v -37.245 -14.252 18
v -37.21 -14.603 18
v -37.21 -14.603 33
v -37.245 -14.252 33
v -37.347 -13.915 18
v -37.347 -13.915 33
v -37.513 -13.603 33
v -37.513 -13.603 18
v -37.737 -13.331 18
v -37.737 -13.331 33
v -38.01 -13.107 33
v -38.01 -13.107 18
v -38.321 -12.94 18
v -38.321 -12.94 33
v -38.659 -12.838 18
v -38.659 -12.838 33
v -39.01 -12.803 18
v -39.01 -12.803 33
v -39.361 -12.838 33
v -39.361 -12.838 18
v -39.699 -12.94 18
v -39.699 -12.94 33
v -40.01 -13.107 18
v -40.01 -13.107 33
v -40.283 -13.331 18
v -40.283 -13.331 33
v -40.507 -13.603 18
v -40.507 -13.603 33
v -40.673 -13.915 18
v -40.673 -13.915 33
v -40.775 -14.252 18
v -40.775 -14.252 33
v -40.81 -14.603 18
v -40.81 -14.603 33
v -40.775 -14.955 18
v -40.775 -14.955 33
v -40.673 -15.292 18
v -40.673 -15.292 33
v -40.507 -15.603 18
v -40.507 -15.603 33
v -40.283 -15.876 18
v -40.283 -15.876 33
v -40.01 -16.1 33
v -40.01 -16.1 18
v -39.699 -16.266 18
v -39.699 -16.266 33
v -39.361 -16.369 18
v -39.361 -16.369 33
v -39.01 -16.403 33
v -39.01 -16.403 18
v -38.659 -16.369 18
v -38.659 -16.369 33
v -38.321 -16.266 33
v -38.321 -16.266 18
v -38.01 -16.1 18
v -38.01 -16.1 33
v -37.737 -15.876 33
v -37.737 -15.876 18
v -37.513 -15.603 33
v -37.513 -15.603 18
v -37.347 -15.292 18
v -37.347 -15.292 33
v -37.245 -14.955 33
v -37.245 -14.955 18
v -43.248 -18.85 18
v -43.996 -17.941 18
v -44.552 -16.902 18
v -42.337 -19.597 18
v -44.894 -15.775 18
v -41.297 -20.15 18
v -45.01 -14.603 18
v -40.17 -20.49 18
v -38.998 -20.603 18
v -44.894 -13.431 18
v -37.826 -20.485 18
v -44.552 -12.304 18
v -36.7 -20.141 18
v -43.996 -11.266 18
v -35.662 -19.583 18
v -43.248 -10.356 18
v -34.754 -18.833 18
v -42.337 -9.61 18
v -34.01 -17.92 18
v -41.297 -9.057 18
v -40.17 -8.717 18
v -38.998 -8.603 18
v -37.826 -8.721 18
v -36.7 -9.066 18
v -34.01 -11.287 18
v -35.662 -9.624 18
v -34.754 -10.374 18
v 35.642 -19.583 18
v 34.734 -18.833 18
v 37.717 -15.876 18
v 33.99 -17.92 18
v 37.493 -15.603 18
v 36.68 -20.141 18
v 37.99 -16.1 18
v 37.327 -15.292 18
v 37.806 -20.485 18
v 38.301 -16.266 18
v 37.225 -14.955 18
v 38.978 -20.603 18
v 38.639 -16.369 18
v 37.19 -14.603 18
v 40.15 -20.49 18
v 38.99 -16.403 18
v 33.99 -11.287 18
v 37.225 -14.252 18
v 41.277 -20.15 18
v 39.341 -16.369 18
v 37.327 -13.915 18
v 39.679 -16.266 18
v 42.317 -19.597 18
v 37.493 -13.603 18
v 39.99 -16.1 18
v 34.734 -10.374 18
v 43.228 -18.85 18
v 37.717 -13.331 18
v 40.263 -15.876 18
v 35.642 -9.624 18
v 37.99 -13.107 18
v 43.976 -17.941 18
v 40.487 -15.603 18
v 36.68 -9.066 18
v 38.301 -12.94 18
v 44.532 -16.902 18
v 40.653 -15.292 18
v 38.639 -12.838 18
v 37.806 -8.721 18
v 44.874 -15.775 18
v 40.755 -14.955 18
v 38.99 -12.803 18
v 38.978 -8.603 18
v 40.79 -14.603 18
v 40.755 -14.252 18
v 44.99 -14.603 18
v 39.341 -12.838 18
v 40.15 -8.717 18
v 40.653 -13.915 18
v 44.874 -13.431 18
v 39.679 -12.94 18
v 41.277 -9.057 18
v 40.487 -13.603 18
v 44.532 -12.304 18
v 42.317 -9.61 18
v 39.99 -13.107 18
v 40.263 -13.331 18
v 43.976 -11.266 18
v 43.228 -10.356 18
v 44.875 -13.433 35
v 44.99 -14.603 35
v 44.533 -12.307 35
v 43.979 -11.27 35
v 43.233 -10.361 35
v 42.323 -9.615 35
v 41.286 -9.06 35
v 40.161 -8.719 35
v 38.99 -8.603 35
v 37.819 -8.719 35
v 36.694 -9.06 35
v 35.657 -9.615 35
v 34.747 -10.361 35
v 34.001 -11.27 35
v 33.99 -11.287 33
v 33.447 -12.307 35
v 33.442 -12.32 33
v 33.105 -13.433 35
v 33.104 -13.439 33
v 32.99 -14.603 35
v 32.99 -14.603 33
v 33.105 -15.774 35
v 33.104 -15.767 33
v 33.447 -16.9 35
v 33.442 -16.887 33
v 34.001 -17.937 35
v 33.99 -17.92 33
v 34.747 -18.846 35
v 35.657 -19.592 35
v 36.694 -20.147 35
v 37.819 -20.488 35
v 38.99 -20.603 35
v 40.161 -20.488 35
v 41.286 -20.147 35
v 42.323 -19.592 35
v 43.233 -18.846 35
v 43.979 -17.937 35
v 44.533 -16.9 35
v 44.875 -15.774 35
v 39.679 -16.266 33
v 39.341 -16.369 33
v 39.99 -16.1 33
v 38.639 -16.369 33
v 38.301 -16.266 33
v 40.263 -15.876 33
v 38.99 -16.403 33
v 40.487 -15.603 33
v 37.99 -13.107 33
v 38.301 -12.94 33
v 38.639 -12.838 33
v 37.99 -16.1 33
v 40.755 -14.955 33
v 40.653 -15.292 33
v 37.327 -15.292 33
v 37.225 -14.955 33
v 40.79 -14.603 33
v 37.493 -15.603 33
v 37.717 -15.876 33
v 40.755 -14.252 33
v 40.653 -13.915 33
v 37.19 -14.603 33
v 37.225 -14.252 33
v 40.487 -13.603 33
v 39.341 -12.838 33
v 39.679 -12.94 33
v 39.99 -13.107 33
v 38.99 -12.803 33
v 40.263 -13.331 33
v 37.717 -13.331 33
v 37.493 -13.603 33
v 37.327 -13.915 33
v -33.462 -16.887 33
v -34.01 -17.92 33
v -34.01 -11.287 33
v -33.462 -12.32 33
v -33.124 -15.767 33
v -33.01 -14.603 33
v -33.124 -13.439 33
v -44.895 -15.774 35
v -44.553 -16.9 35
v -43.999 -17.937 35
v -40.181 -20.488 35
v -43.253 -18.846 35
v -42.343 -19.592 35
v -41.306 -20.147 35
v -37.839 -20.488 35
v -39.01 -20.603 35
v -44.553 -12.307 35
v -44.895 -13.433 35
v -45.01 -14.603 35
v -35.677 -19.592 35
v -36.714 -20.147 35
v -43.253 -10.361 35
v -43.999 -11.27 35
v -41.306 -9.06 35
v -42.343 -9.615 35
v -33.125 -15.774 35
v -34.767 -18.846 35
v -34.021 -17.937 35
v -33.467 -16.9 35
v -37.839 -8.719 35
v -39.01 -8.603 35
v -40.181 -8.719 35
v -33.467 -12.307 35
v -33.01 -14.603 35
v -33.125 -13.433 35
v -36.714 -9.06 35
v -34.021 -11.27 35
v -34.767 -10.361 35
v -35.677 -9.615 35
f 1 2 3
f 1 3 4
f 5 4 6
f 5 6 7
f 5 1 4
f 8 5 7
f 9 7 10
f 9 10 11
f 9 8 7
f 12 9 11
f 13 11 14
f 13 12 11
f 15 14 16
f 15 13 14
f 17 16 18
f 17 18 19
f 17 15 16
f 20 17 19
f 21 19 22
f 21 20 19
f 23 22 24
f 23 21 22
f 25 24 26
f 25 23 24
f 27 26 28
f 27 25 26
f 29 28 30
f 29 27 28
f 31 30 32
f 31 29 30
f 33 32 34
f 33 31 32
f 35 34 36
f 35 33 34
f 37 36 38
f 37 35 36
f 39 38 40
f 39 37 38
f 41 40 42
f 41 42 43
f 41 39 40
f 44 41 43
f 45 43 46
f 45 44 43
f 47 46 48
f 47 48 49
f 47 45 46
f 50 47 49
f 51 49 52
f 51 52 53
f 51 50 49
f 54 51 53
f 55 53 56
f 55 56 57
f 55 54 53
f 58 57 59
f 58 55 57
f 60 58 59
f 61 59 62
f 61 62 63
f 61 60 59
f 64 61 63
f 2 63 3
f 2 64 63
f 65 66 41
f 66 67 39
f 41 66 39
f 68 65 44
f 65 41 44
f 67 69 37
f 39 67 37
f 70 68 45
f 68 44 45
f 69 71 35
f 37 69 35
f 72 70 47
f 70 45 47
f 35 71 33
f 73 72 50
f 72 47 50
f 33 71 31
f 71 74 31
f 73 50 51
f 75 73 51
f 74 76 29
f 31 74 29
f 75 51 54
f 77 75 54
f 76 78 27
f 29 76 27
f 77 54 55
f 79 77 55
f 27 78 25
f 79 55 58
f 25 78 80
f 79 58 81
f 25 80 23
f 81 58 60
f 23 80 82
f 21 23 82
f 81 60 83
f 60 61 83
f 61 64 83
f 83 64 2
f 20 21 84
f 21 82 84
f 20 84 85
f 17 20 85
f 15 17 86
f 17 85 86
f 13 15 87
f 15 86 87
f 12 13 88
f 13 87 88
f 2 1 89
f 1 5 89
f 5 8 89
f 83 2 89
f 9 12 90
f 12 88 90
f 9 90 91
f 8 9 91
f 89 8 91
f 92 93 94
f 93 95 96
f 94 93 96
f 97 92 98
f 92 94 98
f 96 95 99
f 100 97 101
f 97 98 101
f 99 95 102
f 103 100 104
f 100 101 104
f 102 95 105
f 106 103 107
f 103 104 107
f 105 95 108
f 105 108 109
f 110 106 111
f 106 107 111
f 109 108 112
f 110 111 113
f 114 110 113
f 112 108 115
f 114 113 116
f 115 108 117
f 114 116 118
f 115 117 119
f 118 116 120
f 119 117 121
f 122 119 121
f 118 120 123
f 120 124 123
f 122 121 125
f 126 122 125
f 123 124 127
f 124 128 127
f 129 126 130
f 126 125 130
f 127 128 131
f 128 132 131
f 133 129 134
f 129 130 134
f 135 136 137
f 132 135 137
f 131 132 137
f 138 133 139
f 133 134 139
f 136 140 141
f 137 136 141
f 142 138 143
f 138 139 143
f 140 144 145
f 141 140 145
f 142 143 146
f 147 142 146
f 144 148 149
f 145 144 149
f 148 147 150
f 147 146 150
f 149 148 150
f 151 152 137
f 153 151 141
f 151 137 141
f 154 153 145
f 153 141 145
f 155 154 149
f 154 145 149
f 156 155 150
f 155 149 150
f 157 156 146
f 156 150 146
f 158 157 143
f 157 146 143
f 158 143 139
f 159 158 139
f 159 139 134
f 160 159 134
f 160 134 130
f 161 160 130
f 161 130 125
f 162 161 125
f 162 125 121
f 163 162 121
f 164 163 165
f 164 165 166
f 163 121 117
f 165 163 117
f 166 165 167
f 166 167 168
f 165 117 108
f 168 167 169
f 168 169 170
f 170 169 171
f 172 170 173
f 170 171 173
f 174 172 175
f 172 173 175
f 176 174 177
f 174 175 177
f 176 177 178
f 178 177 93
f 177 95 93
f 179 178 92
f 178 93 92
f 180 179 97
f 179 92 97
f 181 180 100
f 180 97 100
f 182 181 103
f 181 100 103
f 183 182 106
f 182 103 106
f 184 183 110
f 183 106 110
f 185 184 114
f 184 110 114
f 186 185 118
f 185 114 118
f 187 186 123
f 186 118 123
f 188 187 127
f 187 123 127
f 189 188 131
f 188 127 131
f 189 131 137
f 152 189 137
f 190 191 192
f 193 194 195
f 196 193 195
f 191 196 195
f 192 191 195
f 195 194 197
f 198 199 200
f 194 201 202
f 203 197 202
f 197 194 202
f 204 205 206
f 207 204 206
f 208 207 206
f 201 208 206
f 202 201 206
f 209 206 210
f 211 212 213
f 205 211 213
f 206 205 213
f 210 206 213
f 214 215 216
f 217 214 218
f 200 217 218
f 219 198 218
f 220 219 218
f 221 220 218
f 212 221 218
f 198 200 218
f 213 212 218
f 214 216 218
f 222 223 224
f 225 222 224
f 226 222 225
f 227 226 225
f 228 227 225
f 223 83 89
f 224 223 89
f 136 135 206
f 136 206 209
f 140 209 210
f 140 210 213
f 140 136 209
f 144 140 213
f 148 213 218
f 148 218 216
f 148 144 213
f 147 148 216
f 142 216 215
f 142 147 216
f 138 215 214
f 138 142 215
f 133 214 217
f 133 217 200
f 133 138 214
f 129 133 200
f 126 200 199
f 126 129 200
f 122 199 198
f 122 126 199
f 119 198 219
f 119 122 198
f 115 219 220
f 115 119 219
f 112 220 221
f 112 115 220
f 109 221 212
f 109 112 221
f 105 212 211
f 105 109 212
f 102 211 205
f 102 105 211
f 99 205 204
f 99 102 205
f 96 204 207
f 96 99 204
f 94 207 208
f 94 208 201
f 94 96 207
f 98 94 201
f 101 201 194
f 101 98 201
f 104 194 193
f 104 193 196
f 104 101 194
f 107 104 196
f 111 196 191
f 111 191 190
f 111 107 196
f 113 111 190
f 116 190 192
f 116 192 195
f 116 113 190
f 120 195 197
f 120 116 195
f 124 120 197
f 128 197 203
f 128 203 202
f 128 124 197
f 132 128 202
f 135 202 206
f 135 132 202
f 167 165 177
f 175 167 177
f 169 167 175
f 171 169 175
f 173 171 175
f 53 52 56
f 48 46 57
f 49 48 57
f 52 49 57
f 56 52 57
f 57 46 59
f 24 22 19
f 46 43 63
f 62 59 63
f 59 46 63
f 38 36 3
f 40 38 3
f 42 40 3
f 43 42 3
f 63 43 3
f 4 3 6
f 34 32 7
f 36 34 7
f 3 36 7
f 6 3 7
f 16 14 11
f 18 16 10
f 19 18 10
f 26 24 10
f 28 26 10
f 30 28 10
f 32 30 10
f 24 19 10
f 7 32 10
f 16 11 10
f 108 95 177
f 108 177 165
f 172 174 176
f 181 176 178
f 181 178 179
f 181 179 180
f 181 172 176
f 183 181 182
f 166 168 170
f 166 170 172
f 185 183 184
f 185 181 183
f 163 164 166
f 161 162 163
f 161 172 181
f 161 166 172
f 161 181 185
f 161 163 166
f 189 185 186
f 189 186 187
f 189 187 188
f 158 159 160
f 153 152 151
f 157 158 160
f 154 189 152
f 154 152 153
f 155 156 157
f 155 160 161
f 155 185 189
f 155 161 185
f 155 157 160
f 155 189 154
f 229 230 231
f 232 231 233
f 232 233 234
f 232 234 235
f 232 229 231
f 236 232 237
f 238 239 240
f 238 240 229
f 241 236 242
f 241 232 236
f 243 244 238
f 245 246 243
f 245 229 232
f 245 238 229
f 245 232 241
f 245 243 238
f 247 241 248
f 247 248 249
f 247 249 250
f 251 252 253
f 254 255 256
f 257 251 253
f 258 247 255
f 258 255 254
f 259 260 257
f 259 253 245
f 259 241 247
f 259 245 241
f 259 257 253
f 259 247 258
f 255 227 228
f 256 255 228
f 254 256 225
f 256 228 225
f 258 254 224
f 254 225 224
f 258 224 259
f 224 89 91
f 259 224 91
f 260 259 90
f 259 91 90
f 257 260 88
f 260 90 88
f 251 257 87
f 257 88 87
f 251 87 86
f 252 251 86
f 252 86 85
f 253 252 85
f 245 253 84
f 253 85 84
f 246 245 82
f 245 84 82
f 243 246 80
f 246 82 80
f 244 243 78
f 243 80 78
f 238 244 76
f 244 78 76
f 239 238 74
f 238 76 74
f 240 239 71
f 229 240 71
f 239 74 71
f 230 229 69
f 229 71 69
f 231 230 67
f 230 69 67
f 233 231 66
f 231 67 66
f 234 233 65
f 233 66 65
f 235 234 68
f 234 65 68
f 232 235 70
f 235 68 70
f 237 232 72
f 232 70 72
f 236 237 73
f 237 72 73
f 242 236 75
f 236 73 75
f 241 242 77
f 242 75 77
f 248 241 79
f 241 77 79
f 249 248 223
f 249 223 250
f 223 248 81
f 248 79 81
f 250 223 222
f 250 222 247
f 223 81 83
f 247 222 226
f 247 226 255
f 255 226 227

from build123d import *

# Parameters (mm, degrees)
BOX014_W          = 10
BOX014_H          = 10
BOX014_DEPTH      = 15
CYLINDER022_R     = 1.8
CYLINDER022_DEPTH = 15
CYLINDER021_R     = 6
CYLINDER021_DEPTH = 17
BOX012_W          = 5
BOX012_H          = 5
BOX012_DEPTH      = 17
BOX013_W          = 10
BOX013_H          = 10
BOX013_DEPTH      = 15
CYLINDER016_R     = 1.8
CYLINDER016_DEPTH = 15
CYLINDER017_R     = 6
CYLINDER017_DEPTH = 17
BOX011_W          = 5
BOX011_H          = 5
BOX011_DEPTH      = 17


with BuildPart() as kostka014:
    # Box014 → Box014 (new body)
    with BuildSketch(Plane(origin=(23.99, -19.6034, 18), x_dir=(1, 0, 0), z_dir=(0, 0, 1))):
        with Locations((5, 5)):
            Rectangle(BOX014_W, BOX014_H)
    extrude(amount=BOX014_DEPTH)


with BuildPart() as cylinder022:
    # Cylinder022 → Cylinder022 (new body)
    with BuildSketch(Plane(origin=(38.99, -14.6034, 18), x_dir=(1, 0, 0), z_dir=(0, 0, 1))):
        Circle(CYLINDER022_R)
    extrude(amount=CYLINDER022_DEPTH)


with BuildPart() as cylinder021:
    # Cylinder021 → Cylinder021 (new body)
    with BuildSketch(Plane(origin=(38.99, -14.6034, 18), x_dir=(1, 0, 0), z_dir=(0, 0, 1))):
        Circle(CYLINDER021_R)
    extrude(amount=CYLINDER021_DEPTH)


with BuildPart() as cut019:
    # Box012 → Box012 (new body)
    with BuildSketch(Plane(origin=(34.0681, -17.1, 18), x_dir=(1, 0, 0), z_dir=(0, 0, 1))):
        with Locations((2.5, 2.5)):
            Rectangle(BOX012_W, BOX012_H)
    extrude(amount=BOX012_DEPTH)

    # Fusion015: union Cylinder021
    add(cylinder021.part)

    # Cut017: cut Cylinder022
    add(cylinder022.part, mode=Mode.SUBTRACT)

    # Cut019: cut Kostka014
    add(kostka014.part, mode=Mode.SUBTRACT)


with BuildPart() as kostka013:
    # Box013 → Box013 (new body)
    with BuildSketch(Plane(origin=(-34.01, -19.6034, 18), x_dir=(1, 0, 0), z_dir=(0, 0, 1))):
        with Locations((5, 5)):
            Rectangle(BOX013_W, BOX013_H)
    extrude(amount=BOX013_DEPTH)


with BuildPart() as cylinder016:
    # Cylinder016 → Cylinder016 (new body)
    with BuildSketch(Plane(origin=(-39.01, -14.6034, 18), x_dir=(1, 0, 0), z_dir=(0, 0, 1))):
        Circle(CYLINDER016_R)
    extrude(amount=CYLINDER016_DEPTH)


with BuildPart() as cylinder017:
    # Cylinder017 → Cylinder017 (new body)
    with BuildSketch(Plane(origin=(-39.01, -14.6034, 18), x_dir=(1, 0, 0), z_dir=(0, 0, 1))):
        Circle(CYLINDER017_R)
    extrude(amount=CYLINDER017_DEPTH)


with BuildPart() as cover_mount:
    # Box011 → Box011 (new body)
    with BuildSketch(Plane(origin=(-39.01, -17.1034, 18), x_dir=(1, 0, 0), z_dir=(0, 0, 1))):
        with Locations((2.5, 2.5)):
            Rectangle(BOX011_W, BOX011_H)
    extrude(amount=BOX011_DEPTH)

    # Fusion014: union Cylinder017
    add(cylinder017.part)

    # Cut016: cut Cylinder016
    add(cylinder016.part, mode=Mode.SUBTRACT)

    # Cut018: cut Kostka013
    add(kostka013.part, mode=Mode.SUBTRACT)

    # Fusion016: union Cut019
    add(cut019.part)


solid = cover_mount.part
